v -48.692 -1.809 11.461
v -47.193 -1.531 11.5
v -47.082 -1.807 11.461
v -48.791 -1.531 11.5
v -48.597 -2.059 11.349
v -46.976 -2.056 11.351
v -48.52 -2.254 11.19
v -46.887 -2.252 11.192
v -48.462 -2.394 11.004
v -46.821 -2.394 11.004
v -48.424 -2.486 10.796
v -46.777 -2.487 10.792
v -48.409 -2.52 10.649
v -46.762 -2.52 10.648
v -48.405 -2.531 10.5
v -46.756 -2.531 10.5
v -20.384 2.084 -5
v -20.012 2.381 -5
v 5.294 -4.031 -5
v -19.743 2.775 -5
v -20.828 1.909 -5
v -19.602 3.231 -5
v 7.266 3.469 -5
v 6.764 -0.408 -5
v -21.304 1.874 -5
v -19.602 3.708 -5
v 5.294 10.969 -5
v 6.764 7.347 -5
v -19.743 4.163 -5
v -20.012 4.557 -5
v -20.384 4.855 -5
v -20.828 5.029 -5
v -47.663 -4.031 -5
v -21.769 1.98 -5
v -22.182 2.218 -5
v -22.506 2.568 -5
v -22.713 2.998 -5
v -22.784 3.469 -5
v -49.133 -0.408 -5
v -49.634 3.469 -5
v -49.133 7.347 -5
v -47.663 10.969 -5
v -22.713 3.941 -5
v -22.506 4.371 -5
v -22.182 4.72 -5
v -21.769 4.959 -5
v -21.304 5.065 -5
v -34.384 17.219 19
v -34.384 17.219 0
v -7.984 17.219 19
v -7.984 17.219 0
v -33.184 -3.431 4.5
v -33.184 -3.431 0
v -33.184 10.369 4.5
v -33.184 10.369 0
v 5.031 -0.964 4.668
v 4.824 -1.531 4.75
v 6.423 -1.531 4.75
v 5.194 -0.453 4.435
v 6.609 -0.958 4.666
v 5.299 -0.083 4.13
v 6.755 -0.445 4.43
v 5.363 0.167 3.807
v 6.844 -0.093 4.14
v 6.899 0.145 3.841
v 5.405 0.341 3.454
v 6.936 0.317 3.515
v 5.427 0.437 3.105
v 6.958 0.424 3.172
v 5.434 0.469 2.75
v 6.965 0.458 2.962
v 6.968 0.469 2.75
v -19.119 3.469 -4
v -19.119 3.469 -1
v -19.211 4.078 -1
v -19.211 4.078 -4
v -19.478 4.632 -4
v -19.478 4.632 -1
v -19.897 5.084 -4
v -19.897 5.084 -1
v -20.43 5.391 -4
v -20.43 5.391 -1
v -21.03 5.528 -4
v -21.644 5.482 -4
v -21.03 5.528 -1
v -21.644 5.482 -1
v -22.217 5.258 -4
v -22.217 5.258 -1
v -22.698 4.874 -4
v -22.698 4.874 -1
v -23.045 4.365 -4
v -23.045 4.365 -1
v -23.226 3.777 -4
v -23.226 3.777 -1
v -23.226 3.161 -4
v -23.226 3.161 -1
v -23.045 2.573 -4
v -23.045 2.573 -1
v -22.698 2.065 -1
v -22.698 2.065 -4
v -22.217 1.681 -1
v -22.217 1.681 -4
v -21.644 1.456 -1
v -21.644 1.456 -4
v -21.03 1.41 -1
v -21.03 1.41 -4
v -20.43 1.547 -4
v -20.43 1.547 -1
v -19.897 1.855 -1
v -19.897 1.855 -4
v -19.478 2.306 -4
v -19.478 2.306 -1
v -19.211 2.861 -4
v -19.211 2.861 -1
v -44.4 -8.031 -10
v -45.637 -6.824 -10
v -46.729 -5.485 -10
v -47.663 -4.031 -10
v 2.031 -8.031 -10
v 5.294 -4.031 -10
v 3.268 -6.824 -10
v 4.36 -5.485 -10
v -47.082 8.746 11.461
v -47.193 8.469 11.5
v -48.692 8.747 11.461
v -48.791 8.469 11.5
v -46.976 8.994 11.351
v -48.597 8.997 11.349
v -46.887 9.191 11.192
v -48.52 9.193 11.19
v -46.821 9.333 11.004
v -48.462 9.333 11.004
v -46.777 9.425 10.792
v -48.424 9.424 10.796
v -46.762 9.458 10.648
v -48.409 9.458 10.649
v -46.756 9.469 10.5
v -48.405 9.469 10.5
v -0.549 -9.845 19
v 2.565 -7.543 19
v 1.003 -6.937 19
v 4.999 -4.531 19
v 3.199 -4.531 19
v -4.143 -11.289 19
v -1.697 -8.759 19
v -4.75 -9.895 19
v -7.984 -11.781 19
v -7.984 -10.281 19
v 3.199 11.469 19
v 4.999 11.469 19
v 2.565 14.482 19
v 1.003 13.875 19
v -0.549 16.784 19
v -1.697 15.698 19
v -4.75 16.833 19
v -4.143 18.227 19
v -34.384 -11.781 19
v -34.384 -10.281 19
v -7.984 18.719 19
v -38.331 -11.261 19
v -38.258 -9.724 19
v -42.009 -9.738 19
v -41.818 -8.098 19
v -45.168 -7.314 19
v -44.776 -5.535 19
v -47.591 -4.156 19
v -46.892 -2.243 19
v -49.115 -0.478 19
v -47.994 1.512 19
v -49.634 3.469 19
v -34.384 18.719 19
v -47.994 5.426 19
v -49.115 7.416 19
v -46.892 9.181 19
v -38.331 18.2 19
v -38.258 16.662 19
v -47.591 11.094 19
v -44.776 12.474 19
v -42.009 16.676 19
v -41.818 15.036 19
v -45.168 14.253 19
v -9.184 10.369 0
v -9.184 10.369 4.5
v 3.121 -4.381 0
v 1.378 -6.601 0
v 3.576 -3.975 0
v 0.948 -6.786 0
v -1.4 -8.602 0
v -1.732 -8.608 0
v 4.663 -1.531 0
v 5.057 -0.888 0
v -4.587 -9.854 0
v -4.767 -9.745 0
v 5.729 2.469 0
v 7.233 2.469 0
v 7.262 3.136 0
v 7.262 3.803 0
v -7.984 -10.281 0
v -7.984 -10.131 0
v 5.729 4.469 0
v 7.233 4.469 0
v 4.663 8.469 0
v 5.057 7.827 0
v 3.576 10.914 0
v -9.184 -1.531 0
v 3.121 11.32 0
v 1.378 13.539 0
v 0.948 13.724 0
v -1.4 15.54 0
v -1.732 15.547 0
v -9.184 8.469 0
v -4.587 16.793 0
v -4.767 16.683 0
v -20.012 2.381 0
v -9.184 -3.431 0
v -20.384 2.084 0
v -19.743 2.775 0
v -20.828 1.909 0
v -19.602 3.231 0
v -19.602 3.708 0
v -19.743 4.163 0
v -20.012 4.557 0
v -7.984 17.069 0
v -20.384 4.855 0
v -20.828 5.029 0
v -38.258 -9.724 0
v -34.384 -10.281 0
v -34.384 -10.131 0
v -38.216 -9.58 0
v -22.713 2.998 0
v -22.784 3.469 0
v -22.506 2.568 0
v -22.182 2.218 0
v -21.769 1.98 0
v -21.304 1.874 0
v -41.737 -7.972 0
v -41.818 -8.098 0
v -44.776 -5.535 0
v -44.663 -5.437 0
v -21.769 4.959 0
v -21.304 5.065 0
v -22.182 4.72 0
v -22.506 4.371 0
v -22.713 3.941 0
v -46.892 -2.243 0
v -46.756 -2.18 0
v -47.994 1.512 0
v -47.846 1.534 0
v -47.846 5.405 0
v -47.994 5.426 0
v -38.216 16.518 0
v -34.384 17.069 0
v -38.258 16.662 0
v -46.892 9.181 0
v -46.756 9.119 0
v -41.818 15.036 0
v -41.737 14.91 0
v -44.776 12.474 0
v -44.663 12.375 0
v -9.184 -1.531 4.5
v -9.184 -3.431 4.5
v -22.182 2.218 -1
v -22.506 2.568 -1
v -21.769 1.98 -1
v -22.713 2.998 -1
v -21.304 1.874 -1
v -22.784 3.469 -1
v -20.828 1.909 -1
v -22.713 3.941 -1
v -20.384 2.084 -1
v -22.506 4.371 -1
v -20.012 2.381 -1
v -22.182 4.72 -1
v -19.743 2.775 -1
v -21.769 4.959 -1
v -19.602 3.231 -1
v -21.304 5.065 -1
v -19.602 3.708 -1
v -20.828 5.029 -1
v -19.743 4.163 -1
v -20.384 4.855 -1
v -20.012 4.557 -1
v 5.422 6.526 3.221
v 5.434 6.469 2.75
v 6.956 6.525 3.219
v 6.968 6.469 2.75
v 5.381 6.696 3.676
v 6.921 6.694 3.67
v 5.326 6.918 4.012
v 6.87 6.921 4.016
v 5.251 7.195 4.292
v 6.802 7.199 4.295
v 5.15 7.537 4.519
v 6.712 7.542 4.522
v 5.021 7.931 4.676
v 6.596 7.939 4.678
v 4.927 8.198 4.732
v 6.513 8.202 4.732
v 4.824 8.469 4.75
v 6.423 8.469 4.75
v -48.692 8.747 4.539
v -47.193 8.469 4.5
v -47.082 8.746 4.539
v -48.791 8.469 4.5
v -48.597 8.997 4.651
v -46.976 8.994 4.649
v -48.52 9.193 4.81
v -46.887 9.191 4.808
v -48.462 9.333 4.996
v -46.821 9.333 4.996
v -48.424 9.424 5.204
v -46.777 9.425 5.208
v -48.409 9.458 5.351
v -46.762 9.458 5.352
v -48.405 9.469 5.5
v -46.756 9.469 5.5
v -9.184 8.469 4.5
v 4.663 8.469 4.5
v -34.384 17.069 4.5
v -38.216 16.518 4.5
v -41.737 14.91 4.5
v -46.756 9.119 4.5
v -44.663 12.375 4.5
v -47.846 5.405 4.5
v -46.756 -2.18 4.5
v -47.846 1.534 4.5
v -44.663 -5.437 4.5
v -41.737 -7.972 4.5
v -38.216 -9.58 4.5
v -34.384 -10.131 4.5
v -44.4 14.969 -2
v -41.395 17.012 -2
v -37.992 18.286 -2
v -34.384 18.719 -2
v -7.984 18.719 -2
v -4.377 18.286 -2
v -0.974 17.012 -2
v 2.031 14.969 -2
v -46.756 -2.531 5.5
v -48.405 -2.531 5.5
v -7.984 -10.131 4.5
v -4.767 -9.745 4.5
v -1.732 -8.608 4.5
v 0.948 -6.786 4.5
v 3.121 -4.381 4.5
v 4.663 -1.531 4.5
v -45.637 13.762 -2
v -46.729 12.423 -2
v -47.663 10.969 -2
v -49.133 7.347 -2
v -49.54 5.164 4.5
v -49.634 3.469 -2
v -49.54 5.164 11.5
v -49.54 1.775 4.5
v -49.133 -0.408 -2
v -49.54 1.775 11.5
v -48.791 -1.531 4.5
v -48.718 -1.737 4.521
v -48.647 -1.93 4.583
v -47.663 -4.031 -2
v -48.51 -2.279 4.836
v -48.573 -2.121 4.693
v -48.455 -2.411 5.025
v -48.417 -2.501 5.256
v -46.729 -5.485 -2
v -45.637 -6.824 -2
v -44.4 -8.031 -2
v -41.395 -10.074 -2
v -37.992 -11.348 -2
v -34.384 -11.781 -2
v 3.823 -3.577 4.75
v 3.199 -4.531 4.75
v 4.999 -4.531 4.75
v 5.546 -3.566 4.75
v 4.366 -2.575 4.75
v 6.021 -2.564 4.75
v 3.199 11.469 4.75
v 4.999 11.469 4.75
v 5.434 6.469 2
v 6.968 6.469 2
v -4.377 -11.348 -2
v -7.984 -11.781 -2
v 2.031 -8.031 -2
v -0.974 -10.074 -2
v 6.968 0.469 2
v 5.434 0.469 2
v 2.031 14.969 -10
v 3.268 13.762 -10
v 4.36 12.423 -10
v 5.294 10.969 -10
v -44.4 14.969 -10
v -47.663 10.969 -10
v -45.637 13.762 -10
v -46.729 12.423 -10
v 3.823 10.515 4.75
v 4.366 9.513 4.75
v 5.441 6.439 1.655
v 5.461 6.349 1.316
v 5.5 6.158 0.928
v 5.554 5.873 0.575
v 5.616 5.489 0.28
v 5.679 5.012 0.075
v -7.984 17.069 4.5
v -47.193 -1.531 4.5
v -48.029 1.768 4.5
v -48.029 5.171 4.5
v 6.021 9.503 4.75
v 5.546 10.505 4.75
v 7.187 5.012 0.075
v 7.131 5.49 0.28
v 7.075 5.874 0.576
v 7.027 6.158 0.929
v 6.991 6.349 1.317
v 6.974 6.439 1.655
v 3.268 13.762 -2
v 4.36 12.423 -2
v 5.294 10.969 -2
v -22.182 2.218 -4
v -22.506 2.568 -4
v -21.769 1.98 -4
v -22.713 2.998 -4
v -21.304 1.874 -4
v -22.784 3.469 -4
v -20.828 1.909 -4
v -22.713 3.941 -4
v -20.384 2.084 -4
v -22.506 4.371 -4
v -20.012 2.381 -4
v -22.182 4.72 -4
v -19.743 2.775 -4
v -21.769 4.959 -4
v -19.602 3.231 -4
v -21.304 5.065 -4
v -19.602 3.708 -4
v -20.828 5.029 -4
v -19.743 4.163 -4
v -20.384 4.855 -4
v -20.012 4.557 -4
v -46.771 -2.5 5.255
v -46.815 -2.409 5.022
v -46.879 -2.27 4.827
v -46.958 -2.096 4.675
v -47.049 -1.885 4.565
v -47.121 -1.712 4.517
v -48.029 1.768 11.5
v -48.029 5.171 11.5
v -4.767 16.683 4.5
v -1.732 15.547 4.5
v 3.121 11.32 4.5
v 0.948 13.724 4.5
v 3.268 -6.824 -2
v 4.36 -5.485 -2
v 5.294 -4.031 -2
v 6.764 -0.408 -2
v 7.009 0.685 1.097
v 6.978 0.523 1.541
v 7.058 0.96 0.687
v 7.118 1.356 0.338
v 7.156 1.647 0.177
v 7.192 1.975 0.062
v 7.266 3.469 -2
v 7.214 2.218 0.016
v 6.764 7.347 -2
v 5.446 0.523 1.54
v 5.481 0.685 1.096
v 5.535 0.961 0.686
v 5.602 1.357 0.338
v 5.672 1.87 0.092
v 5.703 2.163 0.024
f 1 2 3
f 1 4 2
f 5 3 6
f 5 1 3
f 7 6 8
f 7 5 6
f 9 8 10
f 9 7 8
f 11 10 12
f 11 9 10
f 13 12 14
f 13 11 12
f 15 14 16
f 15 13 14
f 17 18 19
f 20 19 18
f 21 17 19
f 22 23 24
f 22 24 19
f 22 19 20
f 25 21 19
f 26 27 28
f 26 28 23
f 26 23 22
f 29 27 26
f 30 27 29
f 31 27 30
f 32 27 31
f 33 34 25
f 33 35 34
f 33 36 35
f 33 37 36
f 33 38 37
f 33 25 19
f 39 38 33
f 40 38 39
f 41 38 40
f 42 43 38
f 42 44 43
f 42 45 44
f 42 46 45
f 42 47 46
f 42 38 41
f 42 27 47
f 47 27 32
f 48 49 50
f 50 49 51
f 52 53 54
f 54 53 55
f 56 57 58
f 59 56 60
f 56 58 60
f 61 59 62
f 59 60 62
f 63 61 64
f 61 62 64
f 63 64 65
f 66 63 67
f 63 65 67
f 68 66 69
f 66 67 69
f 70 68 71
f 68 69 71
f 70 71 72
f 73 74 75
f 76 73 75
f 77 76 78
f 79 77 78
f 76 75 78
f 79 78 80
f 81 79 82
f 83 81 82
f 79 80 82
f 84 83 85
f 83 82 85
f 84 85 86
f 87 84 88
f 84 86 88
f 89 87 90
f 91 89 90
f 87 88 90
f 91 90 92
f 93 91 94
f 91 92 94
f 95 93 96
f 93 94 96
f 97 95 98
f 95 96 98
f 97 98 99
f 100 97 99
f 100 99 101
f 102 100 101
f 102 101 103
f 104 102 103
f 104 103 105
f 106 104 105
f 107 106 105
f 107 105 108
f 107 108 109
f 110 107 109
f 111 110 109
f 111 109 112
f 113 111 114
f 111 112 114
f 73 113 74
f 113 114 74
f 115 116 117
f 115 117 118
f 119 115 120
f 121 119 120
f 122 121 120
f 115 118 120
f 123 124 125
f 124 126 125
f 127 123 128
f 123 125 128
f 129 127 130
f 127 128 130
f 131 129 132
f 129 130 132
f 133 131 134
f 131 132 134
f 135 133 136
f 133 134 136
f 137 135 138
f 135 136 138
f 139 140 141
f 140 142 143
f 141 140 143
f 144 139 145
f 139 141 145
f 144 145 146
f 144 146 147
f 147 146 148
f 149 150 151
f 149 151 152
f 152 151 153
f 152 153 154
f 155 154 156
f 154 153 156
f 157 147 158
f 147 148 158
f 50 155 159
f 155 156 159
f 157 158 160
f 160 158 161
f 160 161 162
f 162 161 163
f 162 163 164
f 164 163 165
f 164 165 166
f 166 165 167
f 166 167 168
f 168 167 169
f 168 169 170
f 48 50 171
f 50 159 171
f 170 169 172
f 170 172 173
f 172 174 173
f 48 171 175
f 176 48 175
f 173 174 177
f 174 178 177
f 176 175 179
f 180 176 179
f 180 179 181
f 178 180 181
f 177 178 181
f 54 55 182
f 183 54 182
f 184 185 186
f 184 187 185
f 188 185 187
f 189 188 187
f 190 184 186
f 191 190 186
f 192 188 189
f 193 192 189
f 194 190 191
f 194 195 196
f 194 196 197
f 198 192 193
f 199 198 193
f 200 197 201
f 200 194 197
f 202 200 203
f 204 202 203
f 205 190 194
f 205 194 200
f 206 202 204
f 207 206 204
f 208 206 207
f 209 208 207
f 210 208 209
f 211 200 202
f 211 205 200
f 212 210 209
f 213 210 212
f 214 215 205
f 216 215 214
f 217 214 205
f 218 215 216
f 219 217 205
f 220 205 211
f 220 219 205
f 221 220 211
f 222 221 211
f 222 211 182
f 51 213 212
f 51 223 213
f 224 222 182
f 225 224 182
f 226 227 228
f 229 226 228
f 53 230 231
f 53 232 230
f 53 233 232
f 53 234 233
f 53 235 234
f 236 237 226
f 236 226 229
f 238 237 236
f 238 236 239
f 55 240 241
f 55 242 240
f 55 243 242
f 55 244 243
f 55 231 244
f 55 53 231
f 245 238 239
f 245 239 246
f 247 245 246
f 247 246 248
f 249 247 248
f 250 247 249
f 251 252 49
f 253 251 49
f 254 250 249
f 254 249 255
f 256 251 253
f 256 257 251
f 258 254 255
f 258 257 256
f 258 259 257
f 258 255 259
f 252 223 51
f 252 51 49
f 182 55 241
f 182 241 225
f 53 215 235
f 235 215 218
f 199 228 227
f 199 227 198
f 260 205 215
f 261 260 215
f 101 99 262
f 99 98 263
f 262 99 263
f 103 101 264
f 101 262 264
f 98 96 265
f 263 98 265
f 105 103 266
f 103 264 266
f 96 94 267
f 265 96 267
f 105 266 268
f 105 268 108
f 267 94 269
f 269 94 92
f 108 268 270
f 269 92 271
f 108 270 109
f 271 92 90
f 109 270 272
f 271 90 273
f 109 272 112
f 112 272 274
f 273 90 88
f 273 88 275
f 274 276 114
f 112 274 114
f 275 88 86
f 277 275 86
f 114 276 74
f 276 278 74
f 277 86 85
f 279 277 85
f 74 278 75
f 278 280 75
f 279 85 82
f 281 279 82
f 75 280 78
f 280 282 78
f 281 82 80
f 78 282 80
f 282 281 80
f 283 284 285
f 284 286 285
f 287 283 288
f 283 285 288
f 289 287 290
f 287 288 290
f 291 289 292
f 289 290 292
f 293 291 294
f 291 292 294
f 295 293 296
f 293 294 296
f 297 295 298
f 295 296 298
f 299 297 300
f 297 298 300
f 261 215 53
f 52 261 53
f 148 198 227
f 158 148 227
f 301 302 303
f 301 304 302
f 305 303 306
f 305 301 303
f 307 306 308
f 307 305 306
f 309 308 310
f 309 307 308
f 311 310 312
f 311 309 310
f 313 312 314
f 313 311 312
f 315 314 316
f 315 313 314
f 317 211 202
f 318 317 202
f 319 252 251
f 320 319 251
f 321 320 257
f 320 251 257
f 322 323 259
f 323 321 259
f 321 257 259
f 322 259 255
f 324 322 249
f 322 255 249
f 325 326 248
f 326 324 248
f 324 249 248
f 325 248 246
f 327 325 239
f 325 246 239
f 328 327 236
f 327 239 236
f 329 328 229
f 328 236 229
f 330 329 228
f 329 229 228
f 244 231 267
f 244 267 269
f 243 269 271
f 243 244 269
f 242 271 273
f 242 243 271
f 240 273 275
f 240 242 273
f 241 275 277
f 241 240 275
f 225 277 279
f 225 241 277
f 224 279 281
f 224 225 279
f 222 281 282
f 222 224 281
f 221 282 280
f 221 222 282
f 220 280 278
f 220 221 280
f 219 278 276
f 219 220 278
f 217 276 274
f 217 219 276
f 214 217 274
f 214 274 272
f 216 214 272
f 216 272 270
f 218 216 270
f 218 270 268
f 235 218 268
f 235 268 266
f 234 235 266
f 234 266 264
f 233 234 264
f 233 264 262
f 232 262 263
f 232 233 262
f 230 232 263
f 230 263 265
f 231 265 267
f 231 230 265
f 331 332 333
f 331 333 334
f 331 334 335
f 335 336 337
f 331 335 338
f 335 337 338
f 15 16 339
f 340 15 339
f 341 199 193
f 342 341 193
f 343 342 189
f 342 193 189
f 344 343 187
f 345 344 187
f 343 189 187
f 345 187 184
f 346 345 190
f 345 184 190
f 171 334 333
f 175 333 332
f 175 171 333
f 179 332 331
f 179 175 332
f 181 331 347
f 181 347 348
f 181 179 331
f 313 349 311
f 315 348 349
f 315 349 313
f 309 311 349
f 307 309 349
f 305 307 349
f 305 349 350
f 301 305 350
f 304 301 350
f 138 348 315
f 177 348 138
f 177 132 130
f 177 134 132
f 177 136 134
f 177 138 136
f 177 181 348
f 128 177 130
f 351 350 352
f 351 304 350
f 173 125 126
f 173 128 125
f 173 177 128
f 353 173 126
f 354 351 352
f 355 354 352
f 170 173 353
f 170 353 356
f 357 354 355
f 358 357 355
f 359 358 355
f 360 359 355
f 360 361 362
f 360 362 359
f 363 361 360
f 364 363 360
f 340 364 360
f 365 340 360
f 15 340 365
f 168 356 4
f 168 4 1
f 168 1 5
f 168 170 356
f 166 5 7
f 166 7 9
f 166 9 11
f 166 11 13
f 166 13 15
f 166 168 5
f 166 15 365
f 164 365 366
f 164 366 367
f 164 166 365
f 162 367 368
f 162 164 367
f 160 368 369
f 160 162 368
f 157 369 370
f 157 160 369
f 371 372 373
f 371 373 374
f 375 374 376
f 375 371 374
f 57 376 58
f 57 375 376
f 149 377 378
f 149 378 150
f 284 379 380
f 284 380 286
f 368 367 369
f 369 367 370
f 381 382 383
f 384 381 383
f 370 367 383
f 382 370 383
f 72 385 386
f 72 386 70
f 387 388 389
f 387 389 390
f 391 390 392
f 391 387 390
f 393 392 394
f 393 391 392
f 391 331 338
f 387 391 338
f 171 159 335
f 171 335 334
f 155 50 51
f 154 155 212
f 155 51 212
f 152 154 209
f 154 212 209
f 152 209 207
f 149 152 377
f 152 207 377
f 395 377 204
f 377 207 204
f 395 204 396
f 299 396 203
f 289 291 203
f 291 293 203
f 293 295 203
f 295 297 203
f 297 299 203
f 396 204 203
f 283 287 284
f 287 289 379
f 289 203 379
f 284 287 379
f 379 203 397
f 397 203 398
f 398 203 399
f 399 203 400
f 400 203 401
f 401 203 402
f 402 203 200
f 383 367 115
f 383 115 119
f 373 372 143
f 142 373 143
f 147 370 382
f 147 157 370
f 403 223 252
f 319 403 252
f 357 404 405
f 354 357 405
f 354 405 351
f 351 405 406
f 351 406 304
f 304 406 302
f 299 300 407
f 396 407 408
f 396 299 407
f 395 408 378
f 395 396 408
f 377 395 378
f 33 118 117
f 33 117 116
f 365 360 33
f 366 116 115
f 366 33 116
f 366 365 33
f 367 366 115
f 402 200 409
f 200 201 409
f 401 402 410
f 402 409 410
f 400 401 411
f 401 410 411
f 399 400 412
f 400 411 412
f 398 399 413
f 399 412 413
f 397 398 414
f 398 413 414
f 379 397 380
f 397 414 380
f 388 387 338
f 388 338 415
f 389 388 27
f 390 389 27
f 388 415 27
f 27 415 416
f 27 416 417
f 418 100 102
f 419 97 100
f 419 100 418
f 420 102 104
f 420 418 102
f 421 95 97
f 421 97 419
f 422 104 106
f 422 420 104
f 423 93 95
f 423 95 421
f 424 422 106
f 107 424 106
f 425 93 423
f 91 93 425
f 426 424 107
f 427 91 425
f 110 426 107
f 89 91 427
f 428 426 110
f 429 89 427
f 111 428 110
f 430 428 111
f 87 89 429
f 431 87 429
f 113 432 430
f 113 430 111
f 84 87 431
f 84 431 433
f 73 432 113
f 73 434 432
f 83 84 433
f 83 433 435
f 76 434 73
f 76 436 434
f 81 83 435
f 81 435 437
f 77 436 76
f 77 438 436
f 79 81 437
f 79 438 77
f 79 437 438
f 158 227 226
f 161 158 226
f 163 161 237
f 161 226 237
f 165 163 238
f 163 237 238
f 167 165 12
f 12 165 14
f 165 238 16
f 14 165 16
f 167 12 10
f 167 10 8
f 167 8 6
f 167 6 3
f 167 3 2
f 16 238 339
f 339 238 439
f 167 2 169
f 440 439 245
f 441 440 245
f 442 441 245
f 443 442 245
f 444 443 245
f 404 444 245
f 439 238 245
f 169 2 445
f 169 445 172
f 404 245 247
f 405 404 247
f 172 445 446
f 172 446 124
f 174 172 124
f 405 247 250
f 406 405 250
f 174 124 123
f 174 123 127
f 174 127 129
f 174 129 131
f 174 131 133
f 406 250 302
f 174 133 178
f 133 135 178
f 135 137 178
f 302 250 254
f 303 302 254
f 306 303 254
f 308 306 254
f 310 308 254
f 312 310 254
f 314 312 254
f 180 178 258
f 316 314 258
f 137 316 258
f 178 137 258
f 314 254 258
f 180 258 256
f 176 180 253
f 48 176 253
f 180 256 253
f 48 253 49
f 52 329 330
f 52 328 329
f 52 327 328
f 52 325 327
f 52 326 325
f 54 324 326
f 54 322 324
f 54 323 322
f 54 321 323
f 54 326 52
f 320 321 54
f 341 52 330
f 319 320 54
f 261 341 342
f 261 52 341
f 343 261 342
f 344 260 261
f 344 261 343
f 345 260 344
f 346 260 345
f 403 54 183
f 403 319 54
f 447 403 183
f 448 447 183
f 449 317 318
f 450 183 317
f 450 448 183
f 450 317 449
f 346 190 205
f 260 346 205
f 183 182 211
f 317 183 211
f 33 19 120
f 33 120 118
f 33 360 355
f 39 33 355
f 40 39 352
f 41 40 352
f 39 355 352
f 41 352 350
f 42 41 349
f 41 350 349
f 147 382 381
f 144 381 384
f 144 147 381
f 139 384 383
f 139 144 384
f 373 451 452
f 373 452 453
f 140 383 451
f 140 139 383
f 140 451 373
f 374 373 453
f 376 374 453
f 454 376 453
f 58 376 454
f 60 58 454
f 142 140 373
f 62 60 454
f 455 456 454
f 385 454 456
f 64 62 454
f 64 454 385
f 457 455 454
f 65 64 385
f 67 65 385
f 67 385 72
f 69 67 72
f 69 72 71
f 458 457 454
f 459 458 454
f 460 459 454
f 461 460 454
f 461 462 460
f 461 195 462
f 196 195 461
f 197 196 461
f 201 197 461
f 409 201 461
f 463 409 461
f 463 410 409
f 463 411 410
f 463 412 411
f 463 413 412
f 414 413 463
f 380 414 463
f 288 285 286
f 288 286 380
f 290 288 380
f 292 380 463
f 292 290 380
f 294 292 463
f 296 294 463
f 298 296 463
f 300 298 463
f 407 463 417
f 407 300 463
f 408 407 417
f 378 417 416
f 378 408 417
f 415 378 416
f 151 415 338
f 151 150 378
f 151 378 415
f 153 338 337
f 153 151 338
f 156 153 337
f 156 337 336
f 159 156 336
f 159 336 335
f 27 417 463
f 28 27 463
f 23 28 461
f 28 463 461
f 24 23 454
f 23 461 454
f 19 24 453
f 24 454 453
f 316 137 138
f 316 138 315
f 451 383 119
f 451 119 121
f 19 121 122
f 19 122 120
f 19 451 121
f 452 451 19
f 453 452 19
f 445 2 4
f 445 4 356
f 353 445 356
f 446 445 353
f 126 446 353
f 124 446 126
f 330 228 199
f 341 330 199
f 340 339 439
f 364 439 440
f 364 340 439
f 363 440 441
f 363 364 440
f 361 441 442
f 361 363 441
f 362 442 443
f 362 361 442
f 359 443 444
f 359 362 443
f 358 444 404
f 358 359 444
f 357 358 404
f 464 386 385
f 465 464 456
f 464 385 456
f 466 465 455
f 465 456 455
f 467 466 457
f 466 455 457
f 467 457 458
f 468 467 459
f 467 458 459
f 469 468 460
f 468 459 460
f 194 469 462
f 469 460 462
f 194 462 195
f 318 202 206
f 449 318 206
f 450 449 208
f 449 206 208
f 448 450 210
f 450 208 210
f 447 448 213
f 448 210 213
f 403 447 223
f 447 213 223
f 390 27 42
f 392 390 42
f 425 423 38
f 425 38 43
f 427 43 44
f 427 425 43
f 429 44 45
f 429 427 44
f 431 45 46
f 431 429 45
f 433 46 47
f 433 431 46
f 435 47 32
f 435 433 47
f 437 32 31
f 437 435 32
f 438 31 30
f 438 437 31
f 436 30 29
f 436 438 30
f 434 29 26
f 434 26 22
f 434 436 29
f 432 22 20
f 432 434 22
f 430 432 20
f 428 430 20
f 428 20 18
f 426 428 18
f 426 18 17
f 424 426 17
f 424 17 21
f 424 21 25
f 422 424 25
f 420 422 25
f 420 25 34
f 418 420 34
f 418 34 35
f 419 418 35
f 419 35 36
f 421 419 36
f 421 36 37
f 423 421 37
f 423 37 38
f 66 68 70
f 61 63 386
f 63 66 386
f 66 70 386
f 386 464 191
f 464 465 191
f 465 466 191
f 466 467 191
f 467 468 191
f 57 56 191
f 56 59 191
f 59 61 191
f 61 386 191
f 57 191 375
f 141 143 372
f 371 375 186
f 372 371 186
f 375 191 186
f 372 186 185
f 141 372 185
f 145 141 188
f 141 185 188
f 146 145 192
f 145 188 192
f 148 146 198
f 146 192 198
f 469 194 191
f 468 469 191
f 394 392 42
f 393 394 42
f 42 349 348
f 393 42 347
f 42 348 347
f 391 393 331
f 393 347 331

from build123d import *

# Parameters (mm, degrees)
BOSS_EXTRUDE1_DEPTH = 19
BOSS_EXTRUDE2_DEPTH = 2
BOSS_EXTRUDE3_DEPTH = 4.5
SKETCH4_W           = 4.75
SKETCH4_H           = 6
SKETCH4_W_2         = 14.25
SKETCH4_H_2         = 16
CUT_EXTRUDE1_DEPTH  = 49.452157546
SKETCH5_W           = 7
SKETCH5_H           = 12
CUT_EXTRUDE2_DEPTH  = 49.452157546
FILLET1_R           = 1
SKETCH6_R           = 1.6
BOSS_EXTRUDE4_DEPTH = 3
BOSS_EXTRUDE7_DEPTH = 8
FILLET2_R           = 2
CUT_EXTRUDE3_START  = -10
SKETCH9_R           = 1.6
CUT_EXTRUDE3_DEPTH  = 10
CUT_EXTRUDE4_START  = -1
SKETCH11_R          = 2.065
CUT_EXTRUDE4_DEPTH  = 3


with BuildPart() as part:
    # Sketch1 → Boss-Extrude1 (new body)
    with BuildSketch(Plane.XY):
        with BuildLine():
            Line((-34.384444189, 18.719216619), (-7.984444189, 18.719216619))
            ThreePointArc((-7.984444189, 18.719216619), (7.265555811, 3.469216619), (-7.984444189, -11.780783381))
            Line((-7.984444189, -11.780783381), (-34.384444189, -11.780783381))
            ThreePointArc((-34.384444189, -11.780783381), (-49.634444189, 3.469216619), (-34.384444189, 18.719216619))
        make_face()
        with BuildLine():
            Line((-34.384444189, 17.219216619), (-7.984444189, 17.219216619))
            ThreePointArc((-7.984444189, 17.219216619), (5.765555811, 3.469216619), (-7.984444189, -10.280783381))
            Line((-7.984444189, -10.280783381), (-34.384444189, -10.280783381))
            ThreePointArc((-34.384444189, -10.280783381), (-48.134444189, 3.469216619), (-34.384444189, 17.219216619))
        make_face(mode=Mode.SUBTRACT)
    extrude(amount=BOSS_EXTRUDE1_DEPTH)



with BuildPart() as body_2:
    # Sketch2 → Boss-Extrude2 (new body)
    with BuildSketch(Plane(origin=(0, 0, 0), x_dir=(-1, 0, 0), z_dir=(0, 0, -1))):
        with BuildLine():
            Line((34.384444189, -11.780783381), (7.984444189, -11.780783381))
            ThreePointArc((7.984444189, -11.780783381), (-7.265555811, 3.469216619), (7.984444189, 18.719216619))
            Line((7.984444189, 18.719216619), (34.384444189, 18.719216619))
            ThreePointArc((34.384444189, 18.719216619), (49.634444189, 3.469216619), (34.384444189, -11.780783381))
        make_face()
    extrude(amount=BOSS_EXTRUDE2_DEPTH)


with BuildPart() as part_1:
    add(part.part)

    add(body_2.part)  # Boss-Extrude3 merges body 2
    # Sketch3 → Boss-Extrude3 (add)
    with BuildSketch(Plane.XY):
        with BuildLine():
            Line((-22.664695889, -3.430783381), (-33.184444189, -3.430783381))
            Line((-33.184444189, -3.430783381), (-33.184444189, 10.369216619))
            Line((-33.184444189, 10.369216619), (-19.704192488, 10.369216619))
            Line((-19.704192488, 10.369216619), (-9.184444189, 10.369216619))
            Line((-9.184444189, 10.369216619), (-9.184444189, 8.469216619))
            Line((-9.184444189, 8.469216619), (4.663184056, 8.469216619))
            ThreePointArc((4.663184056, 8.469216619), (-0.337155761, 14.715615149), (-7.984444189, 17.069308538))
            Line((-7.984444189, 17.069308538), (-34.384444189, 17.069308538))
            ThreePointArc((-34.384444189, 17.069308538), (-47.984536108, 3.469216619), (-34.384444189, -10.1308753))
            Line((-34.384444189, -10.1308753), (-7.984444189, -10.1308753))
            ThreePointArc((-7.984444189, -10.1308753), (-0.337155761, -7.777181911), (4.663184056, -1.530783381))
            Line((4.663184056, -1.530783381), (-9.184444189, -1.530783381))
            Line((-9.184444189, -1.530783381), (-9.184444189, -3.430783381))
            Line((-9.184444189, -3.430783381), (-19.704192488, -3.430783381))
            Line((-19.704192488, -3.430783381), (-22.664695889, -3.430783381))
        make_face()
    extrude(amount=BOSS_EXTRUDE3_DEPTH)

    # Sketch4 → Cut-Extrude1 (cut, through all)
    with BuildSketch(Plane.ZY.offset(9.184444189)):
        with Locations((2.375, 3.469216619)):
            Rectangle(SKETCH4_W, SKETCH4_H)
        with Locations((11.875, 3.469216619)):
            Rectangle(SKETCH4_W_2, SKETCH4_H_2)
    extrude(amount=-CUT_EXTRUDE1_DEPTH, mode=Mode.SUBTRACT)

    # Sketch5 → Cut-Extrude2 (cut, through all)
    with BuildSketch(Plane(origin=(-33.184444189, 0, 0), x_dir=(0, 0, -1), z_dir=(1, 0, 0))):
        with Locations((-8, 3.469216619)):
            Rectangle(SKETCH5_W, SKETCH5_H)
    extrude(amount=-CUT_EXTRUDE2_DEPTH, mode=Mode.SUBTRACT)

    # Fillet1
    fillet1_edges = [part_1.edges().sort_by_distance(p)[0] for p in [
        (-47.580403151, -2.530783381, 11.5),
        (-47.580403151, 9.469216619, 11.5),
        (-47.580403151, 9.469216619, 4.5),
        (-47.580403151, -2.530783381, 4.5),
    ]]
    fillet(fillet1_edges, radius=FILLET1_R)

    # Sketch6 → Boss-Extrude4 (add)
    with BuildSketch(Plane(origin=(0, 0, -2), x_dir=(-1, 0, 0), z_dir=(0, 0, -1))):
        with BuildLine():
            ThreePointArc((47.662715914, -4.030783381), (49.634444189, 3.469216619), (47.662715914, 10.969216619))
            Line((47.662715914, 10.969216619), (-5.293827536, 10.969216619))
            ThreePointArc((-5.293827536, 10.969216619), (-7.265555811, 3.469216619), (-5.293827536, -4.030783381))
            Line((-5.293827536, -4.030783381), (47.662715914, -4.030783381))
        make_face()
        with Locations((21.184444189, 3.469216619)):
            Circle(SKETCH6_R, mode=Mode.SUBTRACT)
    extrude(amount=BOSS_EXTRUDE4_DEPTH)

    # Sketch10 → Boss-Extrude7 (add)
    with BuildSketch(Plane(origin=(0, 0, -2), x_dir=(-1, 0, 0), z_dir=(0, 0, -1))):
        with BuildLine():
            Line((-5.293827536, -4.030783381), (47.662715914, -4.030783381))
            ThreePointArc((47.662715914, -4.030783381), (46.201857789, -6.169830834), (44.400057001, -8.030783381))
            Line((44.400057001, -8.030783381), (-2.031168623, -8.030783381))
            ThreePointArc((-2.031168623, -8.030783381), (-3.832969412, -6.169830834), (-5.293827536, -4.030783381))
        make_face()
        with BuildLine():
            Line((-5.293827536, 10.969216619), (47.662715914, 10.969216619))
            ThreePointArc((47.662715914, 10.969216619), (46.201857789, 13.108264072), (44.400057001, 14.969216619))
            Line((44.400057001, 14.969216619), (-2.031168623, 14.969216619))
            ThreePointArc((-2.031168623, 14.969216619), (-3.832969412, 13.108264072), (-5.293827536, 10.969216619))
        make_face()
    extrude(amount=BOSS_EXTRUDE7_DEPTH)

    # Fillet2
    fillet2_edges = [part_1.edges().sort_by_distance(p)[0] for p in [
        (6.200927538, 0.469216619, 0),
        (6.200927538, 6.469216619, 0),
        (6.200927538, 6.469216619, 4.75),
        (6.200927538, 0.469216619, 4.75),
    ]]
    fillet(fillet2_edges, radius=FILLET2_R)

    # Sketch9 → Cut-Extrude3 (cut)
    with BuildSketch(Plane(origin=(0, 0, -2), x_dir=(-1, 0, 0), z_dir=(0, 0, -1)).offset(CUT_EXTRUDE3_START)):
        with Locations((21.184444189, 3.469216619)):
            Circle(SKETCH9_R)
    extrude(amount=CUT_EXTRUDE3_DEPTH, mode=Mode.SUBTRACT)

    # Sketch11 → Cut-Extrude4 (cut)
    with BuildSketch(Plane.XY.offset(CUT_EXTRUDE4_START)):
        with Locations((-21.184444189, 3.469216619)):
            Circle(SKETCH11_R)
    extrude(amount=-CUT_EXTRUDE4_DEPTH, mode=Mode.SUBTRACT)


solid = part_1.part
